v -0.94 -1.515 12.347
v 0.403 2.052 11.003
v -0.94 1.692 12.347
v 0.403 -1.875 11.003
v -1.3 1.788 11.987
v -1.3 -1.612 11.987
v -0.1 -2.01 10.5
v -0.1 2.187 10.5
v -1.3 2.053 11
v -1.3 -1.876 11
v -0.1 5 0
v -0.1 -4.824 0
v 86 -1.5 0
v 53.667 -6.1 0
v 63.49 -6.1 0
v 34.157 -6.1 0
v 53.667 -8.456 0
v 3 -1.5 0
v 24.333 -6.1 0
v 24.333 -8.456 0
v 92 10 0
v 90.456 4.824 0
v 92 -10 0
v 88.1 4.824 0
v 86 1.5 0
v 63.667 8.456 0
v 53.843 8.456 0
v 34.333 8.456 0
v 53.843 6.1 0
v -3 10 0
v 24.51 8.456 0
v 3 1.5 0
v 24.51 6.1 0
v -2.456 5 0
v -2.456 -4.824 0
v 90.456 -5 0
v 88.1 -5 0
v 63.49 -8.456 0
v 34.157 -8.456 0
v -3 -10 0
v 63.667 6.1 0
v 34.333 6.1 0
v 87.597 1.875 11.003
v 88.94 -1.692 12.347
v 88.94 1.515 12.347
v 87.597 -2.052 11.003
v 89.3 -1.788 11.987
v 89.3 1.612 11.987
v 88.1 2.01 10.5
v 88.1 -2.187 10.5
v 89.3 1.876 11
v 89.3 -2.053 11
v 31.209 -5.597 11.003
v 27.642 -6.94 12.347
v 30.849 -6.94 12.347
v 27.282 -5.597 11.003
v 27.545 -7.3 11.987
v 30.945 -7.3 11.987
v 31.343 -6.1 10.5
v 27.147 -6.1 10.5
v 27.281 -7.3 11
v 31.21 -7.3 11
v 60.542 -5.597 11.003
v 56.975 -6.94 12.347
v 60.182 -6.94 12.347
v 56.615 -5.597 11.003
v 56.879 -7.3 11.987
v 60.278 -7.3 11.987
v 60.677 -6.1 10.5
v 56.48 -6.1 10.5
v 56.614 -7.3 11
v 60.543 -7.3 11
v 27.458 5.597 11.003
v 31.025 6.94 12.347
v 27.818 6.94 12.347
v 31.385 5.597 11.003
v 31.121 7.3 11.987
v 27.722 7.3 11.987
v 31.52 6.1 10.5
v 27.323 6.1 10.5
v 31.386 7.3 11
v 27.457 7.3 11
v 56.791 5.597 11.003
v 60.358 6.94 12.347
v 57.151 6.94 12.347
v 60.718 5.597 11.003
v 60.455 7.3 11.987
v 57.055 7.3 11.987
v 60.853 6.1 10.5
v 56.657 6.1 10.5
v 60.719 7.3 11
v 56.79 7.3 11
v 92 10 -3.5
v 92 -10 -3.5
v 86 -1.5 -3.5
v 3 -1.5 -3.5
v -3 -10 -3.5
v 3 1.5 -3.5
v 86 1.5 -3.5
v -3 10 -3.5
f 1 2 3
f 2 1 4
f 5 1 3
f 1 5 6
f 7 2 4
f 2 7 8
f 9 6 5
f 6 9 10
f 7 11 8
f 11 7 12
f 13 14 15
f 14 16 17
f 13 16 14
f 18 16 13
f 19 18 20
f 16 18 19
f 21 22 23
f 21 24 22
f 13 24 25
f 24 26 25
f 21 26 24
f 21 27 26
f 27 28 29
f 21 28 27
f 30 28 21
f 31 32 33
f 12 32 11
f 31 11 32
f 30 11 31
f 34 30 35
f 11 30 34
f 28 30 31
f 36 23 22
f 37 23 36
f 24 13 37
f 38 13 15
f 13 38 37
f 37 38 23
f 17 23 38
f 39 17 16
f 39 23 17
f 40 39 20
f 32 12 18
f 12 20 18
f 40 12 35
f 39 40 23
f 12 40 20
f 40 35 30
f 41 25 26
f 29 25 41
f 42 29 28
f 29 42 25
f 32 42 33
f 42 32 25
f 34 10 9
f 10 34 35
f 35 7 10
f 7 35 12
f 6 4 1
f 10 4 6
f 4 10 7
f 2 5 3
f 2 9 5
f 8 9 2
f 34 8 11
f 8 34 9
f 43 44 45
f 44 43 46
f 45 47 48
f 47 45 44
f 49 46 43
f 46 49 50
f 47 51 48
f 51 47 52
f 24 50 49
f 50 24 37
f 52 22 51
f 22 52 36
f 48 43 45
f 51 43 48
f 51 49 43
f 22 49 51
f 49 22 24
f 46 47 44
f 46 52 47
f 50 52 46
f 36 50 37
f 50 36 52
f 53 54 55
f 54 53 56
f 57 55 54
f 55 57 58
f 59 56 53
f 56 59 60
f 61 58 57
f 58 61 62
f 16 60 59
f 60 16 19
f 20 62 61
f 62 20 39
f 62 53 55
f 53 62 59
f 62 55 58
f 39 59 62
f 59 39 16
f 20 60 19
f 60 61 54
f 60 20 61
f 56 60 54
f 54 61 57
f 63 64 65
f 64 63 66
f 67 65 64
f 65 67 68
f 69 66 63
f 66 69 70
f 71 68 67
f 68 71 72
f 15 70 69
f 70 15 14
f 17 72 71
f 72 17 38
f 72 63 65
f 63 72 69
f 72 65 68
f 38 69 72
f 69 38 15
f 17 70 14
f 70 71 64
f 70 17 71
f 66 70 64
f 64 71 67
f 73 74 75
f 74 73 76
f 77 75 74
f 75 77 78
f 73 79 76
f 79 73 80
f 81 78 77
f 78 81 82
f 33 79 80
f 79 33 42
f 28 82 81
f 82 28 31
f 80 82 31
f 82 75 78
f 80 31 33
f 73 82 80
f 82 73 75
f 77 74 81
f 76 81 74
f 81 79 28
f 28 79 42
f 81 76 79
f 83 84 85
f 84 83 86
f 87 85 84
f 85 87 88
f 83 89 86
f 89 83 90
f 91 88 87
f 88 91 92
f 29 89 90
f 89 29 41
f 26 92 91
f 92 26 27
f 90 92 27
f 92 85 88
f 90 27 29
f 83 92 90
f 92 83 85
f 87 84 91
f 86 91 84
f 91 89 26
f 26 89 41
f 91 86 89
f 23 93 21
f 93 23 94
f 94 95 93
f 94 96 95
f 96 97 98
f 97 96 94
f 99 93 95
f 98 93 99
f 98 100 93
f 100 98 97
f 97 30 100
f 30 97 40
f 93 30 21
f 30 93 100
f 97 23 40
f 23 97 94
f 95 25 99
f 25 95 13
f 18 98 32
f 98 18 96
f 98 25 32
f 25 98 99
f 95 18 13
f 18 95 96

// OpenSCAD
// file: cantilever-snap.scad
/* make a cantilever snap arm.  This is not super robust */

fader_snap_arm_fit_tolerance = 0.1;
 
module cantilever_snap_arm(ih, oh, w, back_angle, d)
{
	translate(v = [-w - fader_snap_arm_fit_tolerance, 0, 0])
	union() {
		cube(size = [w, d, oh]);
		translate(v = [0, 0, oh])
			rotate(v = [0, 1, 0], a = back_angle)
				translate(v = [0, 0, -oh * 1.2])
					cube(size = [w, d, oh * 1.2]);
		translate(v = [0.5 * w, 0, 0.9 * oh]) {
			difference() {
				rotate(v = [0, 1, 0], a = -45) {
					cube(size = [w * 1.3, d, 0.9 * oh - ih]);
				}
				translate(v = [-1.5 * w, -1, 0])
					cube(size = [w, 2 * d, 2 * (oh - ih)]);
			}
		}
	}
}

module tapered_cantilever_snap_arm(ih, oh, w, back_angle, d, taper_angle)
{
	difference() {
		cantilever_snap_arm(ih, oh, w, back_angle, d);
		translate(v = [-2.5 * w, -0.5 * d, 0])
			rotate(v = [1, 0, 0], a = -taper_angle)
				cube(size = [5 * w, 0.5 * d, 2 * oh]);
		translate(v = [-2.5 * w, d, 0])
			rotate(v = [1, 0, 0], a = taper_angle)
				cube(size = [5 * w, 0.5 * d, 2 * oh]);
		translate(v = [-5 * w, -2 * w, -2 * oh])
			cube(size = [10 * w, 2 * d, 2 * oh]);
	}
}

/* tapered_cantilever_snap_arm(8, 11, 1.2, 6, 10, 15); */

module fader_snap_arms()
{
	translate(v = [0, -5, 0]) 
		tapered_cantilever_snap_arm(8, 11, 1.2, 6, 10, 15);
	translate(v = [88, 0, 0])
			rotate(v = [0, 0, 1], a = 180)
				translate(v = [0, -5, 0]) 
					tapered_cantilever_snap_arm(8, 11, 1.2, 6, 10, 15);
	translate(v = [88/3, -6, 0])
		rotate(v = [0, 0, 1], 90)
			translate(v = [0, -5, 0]) 
				tapered_cantilever_snap_arm(8, 11, 1.2, 6, 10, 15);
	translate(v = [2 * 88/3, -6, 0])
		rotate(v = [0, 0, 1], 90)
			translate(v = [0, -5, 0]) 
				tapered_cantilever_snap_arm(8, 11, 1.2, 6, 10, 15);
	translate(v = [88/3, 6, 0])
		rotate(v = [0, 0, 1], -90)
			translate(v = [0, -5, 0]) 
				tapered_cantilever_snap_arm(8, 11, 1.2, 6, 10, 15);
	translate(v = [2 * 88/3, 6, 0])
		rotate(v = [0, 0, 1], -90)
			translate(v = [0, -5, 0]) 
				tapered_cantilever_snap_arm(8, 11, 1.2, 6, 10, 15);
}

/* fader_snap_arms(); */
// main file
include <cantilever-snap.scad>

fader_snap_arms();

difference() {
	translate(v = [-3, -10, -3.5])
		cube(size = [95, 20, 3.5]);
	translate(v = [3, -1.5, -6])
		cube(size = [83, 3, 15]);
}
